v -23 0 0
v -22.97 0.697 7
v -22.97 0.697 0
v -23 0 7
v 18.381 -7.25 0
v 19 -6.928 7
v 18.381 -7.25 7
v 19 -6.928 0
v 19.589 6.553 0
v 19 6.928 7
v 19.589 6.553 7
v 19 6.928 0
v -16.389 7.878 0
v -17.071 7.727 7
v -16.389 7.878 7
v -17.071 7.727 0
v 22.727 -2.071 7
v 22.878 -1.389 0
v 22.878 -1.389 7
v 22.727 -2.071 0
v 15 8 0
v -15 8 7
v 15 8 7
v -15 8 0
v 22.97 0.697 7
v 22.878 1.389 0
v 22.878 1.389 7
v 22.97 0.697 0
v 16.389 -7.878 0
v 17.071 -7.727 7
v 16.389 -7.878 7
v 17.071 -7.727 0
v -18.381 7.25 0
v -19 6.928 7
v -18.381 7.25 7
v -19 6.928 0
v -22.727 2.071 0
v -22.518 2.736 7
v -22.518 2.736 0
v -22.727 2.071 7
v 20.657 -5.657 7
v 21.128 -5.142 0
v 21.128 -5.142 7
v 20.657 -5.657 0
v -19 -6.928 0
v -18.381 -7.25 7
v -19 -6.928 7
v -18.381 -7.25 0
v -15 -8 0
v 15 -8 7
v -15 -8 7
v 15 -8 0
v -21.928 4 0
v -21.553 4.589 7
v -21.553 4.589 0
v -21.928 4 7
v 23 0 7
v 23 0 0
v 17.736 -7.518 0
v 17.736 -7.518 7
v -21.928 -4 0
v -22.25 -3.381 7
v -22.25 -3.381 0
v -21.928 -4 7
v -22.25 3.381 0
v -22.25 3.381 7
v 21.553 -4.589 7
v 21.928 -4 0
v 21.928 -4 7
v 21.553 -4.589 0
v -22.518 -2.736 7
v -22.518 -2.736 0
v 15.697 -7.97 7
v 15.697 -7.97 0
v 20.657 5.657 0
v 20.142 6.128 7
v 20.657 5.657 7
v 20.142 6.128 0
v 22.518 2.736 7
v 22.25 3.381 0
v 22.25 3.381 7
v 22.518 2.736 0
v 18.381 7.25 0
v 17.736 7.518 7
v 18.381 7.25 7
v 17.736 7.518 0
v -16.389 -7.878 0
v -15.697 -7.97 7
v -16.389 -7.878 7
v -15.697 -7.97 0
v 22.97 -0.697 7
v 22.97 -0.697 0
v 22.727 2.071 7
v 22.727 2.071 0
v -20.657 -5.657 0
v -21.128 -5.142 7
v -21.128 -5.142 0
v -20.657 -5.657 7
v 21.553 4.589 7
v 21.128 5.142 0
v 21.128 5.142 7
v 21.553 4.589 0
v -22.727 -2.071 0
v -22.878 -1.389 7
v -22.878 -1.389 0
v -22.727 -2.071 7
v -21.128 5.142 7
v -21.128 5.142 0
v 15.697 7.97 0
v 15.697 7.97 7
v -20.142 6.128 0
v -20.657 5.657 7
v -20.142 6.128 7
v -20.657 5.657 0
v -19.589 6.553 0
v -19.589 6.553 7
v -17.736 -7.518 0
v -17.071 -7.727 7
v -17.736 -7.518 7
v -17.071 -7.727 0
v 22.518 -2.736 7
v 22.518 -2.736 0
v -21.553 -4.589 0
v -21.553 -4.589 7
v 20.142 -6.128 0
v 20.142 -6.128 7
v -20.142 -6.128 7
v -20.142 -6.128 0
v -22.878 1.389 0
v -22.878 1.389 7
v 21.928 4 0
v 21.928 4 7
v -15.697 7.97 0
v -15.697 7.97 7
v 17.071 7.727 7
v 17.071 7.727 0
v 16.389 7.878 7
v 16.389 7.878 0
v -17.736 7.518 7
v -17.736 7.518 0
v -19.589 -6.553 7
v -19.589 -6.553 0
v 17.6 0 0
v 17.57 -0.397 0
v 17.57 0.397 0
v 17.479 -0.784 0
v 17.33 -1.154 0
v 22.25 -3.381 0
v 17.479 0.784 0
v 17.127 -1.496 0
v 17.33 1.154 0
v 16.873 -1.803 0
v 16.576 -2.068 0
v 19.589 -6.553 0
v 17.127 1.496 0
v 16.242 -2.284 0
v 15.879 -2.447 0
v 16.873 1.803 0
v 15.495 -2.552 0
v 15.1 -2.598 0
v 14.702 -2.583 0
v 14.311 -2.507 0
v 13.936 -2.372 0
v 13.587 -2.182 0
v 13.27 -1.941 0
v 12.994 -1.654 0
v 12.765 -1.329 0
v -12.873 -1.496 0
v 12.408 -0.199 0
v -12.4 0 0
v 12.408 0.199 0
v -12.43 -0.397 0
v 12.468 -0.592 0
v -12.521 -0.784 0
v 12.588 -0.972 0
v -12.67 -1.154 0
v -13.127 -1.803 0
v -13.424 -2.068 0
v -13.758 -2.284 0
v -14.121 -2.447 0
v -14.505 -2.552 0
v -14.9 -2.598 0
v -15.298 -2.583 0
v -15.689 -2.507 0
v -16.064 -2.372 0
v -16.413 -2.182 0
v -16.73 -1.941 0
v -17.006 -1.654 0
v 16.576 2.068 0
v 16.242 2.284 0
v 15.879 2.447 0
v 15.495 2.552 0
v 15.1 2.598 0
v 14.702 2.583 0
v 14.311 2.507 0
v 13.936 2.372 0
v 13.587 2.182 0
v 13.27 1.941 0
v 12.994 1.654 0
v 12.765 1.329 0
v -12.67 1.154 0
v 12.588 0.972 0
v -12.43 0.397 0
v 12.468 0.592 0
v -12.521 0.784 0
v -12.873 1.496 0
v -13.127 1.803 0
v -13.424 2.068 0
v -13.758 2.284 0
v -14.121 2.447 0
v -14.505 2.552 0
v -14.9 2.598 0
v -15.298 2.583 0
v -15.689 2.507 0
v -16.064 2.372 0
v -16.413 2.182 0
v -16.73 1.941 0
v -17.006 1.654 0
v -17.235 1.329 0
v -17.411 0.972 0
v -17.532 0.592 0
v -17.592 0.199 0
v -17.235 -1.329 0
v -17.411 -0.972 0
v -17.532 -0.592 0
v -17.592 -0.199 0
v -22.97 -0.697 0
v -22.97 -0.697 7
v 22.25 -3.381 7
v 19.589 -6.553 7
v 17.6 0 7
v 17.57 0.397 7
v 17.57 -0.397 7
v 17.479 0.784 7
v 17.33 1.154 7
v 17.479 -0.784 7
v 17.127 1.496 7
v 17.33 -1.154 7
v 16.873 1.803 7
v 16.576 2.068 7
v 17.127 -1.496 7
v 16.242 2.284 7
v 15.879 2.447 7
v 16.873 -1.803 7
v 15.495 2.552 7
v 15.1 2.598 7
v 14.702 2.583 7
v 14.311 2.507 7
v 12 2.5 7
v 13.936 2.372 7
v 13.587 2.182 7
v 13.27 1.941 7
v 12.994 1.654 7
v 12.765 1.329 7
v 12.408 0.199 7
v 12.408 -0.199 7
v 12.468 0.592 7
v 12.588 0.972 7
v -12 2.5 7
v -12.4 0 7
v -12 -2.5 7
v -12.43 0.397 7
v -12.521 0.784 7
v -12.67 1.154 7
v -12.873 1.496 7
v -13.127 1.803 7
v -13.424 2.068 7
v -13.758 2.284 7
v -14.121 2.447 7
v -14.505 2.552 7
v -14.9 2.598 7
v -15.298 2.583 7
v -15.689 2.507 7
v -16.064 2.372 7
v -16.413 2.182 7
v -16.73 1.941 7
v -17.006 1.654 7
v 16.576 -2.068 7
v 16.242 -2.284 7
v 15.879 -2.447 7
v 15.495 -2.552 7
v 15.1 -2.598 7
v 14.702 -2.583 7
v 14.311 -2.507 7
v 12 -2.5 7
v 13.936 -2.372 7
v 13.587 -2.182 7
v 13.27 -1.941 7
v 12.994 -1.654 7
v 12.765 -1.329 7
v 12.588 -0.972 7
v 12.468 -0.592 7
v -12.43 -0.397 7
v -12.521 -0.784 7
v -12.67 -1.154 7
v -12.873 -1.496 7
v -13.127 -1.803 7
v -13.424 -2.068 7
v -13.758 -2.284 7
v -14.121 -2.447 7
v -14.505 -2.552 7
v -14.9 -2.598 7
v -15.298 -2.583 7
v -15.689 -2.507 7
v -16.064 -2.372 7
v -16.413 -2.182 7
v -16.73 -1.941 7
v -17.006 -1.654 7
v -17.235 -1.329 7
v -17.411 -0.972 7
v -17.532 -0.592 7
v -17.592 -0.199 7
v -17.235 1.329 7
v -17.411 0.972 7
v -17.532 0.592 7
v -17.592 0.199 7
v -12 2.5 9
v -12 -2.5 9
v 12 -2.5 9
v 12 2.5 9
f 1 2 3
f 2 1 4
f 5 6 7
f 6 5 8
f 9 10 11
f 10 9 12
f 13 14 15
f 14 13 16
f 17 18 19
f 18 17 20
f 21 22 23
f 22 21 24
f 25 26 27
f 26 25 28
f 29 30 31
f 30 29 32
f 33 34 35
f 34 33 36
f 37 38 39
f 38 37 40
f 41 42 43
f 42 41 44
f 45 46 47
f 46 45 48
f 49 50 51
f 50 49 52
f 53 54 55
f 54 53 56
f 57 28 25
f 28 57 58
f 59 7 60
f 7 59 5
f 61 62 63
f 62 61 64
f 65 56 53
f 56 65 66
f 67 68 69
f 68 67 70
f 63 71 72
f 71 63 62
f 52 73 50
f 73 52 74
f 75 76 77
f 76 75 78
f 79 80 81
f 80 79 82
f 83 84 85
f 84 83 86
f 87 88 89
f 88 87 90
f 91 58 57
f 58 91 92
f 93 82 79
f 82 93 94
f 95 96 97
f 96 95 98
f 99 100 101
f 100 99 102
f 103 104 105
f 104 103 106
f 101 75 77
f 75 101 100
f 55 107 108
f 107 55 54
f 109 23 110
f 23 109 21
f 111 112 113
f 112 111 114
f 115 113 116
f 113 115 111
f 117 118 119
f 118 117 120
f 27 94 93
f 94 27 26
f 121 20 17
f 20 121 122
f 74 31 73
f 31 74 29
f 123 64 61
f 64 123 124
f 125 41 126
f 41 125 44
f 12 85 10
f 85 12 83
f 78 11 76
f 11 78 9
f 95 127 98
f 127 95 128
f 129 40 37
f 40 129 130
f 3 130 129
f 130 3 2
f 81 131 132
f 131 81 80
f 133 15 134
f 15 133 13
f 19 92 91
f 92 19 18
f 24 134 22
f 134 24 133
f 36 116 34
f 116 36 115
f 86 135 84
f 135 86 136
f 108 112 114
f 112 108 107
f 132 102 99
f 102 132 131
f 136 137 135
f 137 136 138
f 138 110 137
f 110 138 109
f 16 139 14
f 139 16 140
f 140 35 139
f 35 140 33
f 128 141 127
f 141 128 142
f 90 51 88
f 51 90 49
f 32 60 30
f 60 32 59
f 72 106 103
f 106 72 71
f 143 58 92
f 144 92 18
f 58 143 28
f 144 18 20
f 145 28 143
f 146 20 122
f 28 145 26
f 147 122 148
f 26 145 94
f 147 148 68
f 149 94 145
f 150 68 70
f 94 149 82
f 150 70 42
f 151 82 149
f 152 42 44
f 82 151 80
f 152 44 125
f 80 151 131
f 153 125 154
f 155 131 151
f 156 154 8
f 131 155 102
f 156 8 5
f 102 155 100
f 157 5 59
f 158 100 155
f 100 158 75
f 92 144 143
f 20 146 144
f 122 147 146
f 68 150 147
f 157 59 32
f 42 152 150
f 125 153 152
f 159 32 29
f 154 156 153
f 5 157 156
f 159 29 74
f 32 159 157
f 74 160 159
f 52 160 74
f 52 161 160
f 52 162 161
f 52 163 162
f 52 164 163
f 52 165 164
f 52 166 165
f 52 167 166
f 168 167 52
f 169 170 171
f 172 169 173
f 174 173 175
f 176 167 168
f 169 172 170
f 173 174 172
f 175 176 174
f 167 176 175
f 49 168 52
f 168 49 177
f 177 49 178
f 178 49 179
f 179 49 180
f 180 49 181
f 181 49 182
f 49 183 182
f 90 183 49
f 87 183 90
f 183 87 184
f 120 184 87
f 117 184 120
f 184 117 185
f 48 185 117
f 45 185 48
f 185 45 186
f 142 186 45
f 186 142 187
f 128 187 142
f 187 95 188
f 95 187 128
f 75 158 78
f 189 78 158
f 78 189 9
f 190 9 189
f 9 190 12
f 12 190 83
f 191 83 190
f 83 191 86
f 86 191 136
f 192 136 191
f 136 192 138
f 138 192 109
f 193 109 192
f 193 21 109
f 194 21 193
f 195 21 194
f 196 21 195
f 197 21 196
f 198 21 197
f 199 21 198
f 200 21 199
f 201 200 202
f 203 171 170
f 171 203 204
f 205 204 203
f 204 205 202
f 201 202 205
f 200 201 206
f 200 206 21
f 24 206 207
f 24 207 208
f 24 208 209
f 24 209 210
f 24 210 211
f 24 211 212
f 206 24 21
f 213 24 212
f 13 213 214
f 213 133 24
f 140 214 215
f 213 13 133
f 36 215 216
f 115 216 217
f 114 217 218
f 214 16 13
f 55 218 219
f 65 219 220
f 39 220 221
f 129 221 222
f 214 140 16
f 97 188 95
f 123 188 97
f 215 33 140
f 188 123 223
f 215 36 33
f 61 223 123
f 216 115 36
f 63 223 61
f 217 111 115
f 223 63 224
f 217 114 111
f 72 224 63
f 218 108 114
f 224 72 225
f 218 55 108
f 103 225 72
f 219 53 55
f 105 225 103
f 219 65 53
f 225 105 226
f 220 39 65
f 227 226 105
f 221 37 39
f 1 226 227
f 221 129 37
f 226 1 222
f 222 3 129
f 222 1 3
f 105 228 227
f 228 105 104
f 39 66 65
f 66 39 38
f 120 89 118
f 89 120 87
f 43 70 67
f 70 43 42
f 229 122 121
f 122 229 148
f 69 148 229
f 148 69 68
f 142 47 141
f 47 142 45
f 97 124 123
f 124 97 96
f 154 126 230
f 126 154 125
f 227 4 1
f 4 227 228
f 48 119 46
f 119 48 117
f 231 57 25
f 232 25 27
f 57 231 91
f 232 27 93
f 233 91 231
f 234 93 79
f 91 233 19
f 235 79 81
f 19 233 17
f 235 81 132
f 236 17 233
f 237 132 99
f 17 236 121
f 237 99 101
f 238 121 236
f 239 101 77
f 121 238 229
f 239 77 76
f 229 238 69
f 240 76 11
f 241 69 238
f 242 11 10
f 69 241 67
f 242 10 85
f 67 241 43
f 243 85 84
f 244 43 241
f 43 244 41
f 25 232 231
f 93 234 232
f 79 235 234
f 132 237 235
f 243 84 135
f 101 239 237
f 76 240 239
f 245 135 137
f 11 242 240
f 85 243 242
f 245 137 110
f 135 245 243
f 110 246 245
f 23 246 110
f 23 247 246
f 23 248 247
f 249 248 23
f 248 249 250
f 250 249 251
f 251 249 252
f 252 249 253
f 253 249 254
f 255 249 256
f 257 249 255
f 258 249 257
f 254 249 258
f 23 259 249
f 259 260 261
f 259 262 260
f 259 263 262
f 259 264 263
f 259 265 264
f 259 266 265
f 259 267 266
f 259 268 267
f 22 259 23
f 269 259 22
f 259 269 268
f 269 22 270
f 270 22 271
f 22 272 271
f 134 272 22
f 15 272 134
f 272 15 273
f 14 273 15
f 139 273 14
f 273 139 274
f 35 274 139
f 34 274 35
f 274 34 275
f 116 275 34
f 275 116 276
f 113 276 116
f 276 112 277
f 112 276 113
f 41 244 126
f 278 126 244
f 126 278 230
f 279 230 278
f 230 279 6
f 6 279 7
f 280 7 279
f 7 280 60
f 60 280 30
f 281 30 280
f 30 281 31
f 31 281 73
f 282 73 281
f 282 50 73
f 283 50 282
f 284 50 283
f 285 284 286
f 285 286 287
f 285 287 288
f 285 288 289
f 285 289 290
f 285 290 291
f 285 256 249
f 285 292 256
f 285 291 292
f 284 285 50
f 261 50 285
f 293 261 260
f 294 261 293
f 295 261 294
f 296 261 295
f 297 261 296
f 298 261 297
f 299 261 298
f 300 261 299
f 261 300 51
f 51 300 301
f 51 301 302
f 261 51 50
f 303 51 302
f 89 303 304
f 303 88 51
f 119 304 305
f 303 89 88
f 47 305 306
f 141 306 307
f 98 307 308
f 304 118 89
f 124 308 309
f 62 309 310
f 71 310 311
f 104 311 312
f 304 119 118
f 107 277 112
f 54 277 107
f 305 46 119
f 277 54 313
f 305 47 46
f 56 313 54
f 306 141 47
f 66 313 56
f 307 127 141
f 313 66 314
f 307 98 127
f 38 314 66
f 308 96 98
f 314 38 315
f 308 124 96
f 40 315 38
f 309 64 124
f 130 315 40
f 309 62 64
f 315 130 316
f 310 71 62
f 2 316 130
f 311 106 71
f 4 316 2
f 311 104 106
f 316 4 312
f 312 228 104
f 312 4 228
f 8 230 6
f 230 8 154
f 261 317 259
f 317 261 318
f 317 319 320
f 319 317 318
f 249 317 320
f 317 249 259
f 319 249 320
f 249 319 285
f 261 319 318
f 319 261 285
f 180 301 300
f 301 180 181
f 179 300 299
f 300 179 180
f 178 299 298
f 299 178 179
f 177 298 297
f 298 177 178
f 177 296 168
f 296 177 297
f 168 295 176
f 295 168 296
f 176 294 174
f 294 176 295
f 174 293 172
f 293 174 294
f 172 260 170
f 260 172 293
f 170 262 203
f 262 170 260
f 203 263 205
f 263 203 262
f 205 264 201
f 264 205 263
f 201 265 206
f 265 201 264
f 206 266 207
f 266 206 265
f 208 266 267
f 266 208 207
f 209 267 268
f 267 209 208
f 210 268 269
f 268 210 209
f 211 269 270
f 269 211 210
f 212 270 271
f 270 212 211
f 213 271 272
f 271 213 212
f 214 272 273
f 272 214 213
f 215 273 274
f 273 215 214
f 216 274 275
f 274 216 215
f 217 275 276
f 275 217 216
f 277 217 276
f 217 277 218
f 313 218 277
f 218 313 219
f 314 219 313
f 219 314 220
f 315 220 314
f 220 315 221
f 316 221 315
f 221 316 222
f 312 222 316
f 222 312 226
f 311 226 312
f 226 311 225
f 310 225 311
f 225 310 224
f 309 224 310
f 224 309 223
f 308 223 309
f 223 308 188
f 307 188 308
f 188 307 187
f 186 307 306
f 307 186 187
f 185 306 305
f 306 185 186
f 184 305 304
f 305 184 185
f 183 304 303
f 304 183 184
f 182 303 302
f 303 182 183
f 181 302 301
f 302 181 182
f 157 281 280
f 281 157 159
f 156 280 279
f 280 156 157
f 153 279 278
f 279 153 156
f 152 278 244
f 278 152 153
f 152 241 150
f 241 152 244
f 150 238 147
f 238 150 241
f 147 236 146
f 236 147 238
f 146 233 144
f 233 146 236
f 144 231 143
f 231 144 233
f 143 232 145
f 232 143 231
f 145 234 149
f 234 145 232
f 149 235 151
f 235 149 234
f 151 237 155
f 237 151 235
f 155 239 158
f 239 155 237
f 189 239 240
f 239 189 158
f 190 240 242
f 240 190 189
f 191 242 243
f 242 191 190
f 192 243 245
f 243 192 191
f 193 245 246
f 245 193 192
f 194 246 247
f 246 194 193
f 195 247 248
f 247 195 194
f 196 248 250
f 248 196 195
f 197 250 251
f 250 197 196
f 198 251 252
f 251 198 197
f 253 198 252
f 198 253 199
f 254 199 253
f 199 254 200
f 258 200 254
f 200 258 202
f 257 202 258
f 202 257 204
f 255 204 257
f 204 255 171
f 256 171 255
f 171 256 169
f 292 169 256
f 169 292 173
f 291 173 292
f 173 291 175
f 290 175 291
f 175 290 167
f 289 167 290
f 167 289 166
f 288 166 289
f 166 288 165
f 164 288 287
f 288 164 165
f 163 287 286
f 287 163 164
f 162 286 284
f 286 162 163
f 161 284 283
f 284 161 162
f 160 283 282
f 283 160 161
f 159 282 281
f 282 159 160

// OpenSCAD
//$fn=60;
$fa=5;
$fs=.4;

space_height = 7;

difference(){
    body_all();
    mounting_holes();
}

module body_all(){
    linear_extrude(height=space_height) hull(){
        translate([-15,0,0]) circle(d=16);
        translate([15,0,0]) circle(d=16);
    }
    
    translate([0,0,space_height]) linear_extrude(height=2) square([24,5],center=true);
}

module mounting_holes(){
    translate([0,0,-1]) linear_extrude(height=20){
        translate([-15,0,0]) circle(d=5.2);
        translate([15,0,0]) circle(d=5.2);
    }
}
